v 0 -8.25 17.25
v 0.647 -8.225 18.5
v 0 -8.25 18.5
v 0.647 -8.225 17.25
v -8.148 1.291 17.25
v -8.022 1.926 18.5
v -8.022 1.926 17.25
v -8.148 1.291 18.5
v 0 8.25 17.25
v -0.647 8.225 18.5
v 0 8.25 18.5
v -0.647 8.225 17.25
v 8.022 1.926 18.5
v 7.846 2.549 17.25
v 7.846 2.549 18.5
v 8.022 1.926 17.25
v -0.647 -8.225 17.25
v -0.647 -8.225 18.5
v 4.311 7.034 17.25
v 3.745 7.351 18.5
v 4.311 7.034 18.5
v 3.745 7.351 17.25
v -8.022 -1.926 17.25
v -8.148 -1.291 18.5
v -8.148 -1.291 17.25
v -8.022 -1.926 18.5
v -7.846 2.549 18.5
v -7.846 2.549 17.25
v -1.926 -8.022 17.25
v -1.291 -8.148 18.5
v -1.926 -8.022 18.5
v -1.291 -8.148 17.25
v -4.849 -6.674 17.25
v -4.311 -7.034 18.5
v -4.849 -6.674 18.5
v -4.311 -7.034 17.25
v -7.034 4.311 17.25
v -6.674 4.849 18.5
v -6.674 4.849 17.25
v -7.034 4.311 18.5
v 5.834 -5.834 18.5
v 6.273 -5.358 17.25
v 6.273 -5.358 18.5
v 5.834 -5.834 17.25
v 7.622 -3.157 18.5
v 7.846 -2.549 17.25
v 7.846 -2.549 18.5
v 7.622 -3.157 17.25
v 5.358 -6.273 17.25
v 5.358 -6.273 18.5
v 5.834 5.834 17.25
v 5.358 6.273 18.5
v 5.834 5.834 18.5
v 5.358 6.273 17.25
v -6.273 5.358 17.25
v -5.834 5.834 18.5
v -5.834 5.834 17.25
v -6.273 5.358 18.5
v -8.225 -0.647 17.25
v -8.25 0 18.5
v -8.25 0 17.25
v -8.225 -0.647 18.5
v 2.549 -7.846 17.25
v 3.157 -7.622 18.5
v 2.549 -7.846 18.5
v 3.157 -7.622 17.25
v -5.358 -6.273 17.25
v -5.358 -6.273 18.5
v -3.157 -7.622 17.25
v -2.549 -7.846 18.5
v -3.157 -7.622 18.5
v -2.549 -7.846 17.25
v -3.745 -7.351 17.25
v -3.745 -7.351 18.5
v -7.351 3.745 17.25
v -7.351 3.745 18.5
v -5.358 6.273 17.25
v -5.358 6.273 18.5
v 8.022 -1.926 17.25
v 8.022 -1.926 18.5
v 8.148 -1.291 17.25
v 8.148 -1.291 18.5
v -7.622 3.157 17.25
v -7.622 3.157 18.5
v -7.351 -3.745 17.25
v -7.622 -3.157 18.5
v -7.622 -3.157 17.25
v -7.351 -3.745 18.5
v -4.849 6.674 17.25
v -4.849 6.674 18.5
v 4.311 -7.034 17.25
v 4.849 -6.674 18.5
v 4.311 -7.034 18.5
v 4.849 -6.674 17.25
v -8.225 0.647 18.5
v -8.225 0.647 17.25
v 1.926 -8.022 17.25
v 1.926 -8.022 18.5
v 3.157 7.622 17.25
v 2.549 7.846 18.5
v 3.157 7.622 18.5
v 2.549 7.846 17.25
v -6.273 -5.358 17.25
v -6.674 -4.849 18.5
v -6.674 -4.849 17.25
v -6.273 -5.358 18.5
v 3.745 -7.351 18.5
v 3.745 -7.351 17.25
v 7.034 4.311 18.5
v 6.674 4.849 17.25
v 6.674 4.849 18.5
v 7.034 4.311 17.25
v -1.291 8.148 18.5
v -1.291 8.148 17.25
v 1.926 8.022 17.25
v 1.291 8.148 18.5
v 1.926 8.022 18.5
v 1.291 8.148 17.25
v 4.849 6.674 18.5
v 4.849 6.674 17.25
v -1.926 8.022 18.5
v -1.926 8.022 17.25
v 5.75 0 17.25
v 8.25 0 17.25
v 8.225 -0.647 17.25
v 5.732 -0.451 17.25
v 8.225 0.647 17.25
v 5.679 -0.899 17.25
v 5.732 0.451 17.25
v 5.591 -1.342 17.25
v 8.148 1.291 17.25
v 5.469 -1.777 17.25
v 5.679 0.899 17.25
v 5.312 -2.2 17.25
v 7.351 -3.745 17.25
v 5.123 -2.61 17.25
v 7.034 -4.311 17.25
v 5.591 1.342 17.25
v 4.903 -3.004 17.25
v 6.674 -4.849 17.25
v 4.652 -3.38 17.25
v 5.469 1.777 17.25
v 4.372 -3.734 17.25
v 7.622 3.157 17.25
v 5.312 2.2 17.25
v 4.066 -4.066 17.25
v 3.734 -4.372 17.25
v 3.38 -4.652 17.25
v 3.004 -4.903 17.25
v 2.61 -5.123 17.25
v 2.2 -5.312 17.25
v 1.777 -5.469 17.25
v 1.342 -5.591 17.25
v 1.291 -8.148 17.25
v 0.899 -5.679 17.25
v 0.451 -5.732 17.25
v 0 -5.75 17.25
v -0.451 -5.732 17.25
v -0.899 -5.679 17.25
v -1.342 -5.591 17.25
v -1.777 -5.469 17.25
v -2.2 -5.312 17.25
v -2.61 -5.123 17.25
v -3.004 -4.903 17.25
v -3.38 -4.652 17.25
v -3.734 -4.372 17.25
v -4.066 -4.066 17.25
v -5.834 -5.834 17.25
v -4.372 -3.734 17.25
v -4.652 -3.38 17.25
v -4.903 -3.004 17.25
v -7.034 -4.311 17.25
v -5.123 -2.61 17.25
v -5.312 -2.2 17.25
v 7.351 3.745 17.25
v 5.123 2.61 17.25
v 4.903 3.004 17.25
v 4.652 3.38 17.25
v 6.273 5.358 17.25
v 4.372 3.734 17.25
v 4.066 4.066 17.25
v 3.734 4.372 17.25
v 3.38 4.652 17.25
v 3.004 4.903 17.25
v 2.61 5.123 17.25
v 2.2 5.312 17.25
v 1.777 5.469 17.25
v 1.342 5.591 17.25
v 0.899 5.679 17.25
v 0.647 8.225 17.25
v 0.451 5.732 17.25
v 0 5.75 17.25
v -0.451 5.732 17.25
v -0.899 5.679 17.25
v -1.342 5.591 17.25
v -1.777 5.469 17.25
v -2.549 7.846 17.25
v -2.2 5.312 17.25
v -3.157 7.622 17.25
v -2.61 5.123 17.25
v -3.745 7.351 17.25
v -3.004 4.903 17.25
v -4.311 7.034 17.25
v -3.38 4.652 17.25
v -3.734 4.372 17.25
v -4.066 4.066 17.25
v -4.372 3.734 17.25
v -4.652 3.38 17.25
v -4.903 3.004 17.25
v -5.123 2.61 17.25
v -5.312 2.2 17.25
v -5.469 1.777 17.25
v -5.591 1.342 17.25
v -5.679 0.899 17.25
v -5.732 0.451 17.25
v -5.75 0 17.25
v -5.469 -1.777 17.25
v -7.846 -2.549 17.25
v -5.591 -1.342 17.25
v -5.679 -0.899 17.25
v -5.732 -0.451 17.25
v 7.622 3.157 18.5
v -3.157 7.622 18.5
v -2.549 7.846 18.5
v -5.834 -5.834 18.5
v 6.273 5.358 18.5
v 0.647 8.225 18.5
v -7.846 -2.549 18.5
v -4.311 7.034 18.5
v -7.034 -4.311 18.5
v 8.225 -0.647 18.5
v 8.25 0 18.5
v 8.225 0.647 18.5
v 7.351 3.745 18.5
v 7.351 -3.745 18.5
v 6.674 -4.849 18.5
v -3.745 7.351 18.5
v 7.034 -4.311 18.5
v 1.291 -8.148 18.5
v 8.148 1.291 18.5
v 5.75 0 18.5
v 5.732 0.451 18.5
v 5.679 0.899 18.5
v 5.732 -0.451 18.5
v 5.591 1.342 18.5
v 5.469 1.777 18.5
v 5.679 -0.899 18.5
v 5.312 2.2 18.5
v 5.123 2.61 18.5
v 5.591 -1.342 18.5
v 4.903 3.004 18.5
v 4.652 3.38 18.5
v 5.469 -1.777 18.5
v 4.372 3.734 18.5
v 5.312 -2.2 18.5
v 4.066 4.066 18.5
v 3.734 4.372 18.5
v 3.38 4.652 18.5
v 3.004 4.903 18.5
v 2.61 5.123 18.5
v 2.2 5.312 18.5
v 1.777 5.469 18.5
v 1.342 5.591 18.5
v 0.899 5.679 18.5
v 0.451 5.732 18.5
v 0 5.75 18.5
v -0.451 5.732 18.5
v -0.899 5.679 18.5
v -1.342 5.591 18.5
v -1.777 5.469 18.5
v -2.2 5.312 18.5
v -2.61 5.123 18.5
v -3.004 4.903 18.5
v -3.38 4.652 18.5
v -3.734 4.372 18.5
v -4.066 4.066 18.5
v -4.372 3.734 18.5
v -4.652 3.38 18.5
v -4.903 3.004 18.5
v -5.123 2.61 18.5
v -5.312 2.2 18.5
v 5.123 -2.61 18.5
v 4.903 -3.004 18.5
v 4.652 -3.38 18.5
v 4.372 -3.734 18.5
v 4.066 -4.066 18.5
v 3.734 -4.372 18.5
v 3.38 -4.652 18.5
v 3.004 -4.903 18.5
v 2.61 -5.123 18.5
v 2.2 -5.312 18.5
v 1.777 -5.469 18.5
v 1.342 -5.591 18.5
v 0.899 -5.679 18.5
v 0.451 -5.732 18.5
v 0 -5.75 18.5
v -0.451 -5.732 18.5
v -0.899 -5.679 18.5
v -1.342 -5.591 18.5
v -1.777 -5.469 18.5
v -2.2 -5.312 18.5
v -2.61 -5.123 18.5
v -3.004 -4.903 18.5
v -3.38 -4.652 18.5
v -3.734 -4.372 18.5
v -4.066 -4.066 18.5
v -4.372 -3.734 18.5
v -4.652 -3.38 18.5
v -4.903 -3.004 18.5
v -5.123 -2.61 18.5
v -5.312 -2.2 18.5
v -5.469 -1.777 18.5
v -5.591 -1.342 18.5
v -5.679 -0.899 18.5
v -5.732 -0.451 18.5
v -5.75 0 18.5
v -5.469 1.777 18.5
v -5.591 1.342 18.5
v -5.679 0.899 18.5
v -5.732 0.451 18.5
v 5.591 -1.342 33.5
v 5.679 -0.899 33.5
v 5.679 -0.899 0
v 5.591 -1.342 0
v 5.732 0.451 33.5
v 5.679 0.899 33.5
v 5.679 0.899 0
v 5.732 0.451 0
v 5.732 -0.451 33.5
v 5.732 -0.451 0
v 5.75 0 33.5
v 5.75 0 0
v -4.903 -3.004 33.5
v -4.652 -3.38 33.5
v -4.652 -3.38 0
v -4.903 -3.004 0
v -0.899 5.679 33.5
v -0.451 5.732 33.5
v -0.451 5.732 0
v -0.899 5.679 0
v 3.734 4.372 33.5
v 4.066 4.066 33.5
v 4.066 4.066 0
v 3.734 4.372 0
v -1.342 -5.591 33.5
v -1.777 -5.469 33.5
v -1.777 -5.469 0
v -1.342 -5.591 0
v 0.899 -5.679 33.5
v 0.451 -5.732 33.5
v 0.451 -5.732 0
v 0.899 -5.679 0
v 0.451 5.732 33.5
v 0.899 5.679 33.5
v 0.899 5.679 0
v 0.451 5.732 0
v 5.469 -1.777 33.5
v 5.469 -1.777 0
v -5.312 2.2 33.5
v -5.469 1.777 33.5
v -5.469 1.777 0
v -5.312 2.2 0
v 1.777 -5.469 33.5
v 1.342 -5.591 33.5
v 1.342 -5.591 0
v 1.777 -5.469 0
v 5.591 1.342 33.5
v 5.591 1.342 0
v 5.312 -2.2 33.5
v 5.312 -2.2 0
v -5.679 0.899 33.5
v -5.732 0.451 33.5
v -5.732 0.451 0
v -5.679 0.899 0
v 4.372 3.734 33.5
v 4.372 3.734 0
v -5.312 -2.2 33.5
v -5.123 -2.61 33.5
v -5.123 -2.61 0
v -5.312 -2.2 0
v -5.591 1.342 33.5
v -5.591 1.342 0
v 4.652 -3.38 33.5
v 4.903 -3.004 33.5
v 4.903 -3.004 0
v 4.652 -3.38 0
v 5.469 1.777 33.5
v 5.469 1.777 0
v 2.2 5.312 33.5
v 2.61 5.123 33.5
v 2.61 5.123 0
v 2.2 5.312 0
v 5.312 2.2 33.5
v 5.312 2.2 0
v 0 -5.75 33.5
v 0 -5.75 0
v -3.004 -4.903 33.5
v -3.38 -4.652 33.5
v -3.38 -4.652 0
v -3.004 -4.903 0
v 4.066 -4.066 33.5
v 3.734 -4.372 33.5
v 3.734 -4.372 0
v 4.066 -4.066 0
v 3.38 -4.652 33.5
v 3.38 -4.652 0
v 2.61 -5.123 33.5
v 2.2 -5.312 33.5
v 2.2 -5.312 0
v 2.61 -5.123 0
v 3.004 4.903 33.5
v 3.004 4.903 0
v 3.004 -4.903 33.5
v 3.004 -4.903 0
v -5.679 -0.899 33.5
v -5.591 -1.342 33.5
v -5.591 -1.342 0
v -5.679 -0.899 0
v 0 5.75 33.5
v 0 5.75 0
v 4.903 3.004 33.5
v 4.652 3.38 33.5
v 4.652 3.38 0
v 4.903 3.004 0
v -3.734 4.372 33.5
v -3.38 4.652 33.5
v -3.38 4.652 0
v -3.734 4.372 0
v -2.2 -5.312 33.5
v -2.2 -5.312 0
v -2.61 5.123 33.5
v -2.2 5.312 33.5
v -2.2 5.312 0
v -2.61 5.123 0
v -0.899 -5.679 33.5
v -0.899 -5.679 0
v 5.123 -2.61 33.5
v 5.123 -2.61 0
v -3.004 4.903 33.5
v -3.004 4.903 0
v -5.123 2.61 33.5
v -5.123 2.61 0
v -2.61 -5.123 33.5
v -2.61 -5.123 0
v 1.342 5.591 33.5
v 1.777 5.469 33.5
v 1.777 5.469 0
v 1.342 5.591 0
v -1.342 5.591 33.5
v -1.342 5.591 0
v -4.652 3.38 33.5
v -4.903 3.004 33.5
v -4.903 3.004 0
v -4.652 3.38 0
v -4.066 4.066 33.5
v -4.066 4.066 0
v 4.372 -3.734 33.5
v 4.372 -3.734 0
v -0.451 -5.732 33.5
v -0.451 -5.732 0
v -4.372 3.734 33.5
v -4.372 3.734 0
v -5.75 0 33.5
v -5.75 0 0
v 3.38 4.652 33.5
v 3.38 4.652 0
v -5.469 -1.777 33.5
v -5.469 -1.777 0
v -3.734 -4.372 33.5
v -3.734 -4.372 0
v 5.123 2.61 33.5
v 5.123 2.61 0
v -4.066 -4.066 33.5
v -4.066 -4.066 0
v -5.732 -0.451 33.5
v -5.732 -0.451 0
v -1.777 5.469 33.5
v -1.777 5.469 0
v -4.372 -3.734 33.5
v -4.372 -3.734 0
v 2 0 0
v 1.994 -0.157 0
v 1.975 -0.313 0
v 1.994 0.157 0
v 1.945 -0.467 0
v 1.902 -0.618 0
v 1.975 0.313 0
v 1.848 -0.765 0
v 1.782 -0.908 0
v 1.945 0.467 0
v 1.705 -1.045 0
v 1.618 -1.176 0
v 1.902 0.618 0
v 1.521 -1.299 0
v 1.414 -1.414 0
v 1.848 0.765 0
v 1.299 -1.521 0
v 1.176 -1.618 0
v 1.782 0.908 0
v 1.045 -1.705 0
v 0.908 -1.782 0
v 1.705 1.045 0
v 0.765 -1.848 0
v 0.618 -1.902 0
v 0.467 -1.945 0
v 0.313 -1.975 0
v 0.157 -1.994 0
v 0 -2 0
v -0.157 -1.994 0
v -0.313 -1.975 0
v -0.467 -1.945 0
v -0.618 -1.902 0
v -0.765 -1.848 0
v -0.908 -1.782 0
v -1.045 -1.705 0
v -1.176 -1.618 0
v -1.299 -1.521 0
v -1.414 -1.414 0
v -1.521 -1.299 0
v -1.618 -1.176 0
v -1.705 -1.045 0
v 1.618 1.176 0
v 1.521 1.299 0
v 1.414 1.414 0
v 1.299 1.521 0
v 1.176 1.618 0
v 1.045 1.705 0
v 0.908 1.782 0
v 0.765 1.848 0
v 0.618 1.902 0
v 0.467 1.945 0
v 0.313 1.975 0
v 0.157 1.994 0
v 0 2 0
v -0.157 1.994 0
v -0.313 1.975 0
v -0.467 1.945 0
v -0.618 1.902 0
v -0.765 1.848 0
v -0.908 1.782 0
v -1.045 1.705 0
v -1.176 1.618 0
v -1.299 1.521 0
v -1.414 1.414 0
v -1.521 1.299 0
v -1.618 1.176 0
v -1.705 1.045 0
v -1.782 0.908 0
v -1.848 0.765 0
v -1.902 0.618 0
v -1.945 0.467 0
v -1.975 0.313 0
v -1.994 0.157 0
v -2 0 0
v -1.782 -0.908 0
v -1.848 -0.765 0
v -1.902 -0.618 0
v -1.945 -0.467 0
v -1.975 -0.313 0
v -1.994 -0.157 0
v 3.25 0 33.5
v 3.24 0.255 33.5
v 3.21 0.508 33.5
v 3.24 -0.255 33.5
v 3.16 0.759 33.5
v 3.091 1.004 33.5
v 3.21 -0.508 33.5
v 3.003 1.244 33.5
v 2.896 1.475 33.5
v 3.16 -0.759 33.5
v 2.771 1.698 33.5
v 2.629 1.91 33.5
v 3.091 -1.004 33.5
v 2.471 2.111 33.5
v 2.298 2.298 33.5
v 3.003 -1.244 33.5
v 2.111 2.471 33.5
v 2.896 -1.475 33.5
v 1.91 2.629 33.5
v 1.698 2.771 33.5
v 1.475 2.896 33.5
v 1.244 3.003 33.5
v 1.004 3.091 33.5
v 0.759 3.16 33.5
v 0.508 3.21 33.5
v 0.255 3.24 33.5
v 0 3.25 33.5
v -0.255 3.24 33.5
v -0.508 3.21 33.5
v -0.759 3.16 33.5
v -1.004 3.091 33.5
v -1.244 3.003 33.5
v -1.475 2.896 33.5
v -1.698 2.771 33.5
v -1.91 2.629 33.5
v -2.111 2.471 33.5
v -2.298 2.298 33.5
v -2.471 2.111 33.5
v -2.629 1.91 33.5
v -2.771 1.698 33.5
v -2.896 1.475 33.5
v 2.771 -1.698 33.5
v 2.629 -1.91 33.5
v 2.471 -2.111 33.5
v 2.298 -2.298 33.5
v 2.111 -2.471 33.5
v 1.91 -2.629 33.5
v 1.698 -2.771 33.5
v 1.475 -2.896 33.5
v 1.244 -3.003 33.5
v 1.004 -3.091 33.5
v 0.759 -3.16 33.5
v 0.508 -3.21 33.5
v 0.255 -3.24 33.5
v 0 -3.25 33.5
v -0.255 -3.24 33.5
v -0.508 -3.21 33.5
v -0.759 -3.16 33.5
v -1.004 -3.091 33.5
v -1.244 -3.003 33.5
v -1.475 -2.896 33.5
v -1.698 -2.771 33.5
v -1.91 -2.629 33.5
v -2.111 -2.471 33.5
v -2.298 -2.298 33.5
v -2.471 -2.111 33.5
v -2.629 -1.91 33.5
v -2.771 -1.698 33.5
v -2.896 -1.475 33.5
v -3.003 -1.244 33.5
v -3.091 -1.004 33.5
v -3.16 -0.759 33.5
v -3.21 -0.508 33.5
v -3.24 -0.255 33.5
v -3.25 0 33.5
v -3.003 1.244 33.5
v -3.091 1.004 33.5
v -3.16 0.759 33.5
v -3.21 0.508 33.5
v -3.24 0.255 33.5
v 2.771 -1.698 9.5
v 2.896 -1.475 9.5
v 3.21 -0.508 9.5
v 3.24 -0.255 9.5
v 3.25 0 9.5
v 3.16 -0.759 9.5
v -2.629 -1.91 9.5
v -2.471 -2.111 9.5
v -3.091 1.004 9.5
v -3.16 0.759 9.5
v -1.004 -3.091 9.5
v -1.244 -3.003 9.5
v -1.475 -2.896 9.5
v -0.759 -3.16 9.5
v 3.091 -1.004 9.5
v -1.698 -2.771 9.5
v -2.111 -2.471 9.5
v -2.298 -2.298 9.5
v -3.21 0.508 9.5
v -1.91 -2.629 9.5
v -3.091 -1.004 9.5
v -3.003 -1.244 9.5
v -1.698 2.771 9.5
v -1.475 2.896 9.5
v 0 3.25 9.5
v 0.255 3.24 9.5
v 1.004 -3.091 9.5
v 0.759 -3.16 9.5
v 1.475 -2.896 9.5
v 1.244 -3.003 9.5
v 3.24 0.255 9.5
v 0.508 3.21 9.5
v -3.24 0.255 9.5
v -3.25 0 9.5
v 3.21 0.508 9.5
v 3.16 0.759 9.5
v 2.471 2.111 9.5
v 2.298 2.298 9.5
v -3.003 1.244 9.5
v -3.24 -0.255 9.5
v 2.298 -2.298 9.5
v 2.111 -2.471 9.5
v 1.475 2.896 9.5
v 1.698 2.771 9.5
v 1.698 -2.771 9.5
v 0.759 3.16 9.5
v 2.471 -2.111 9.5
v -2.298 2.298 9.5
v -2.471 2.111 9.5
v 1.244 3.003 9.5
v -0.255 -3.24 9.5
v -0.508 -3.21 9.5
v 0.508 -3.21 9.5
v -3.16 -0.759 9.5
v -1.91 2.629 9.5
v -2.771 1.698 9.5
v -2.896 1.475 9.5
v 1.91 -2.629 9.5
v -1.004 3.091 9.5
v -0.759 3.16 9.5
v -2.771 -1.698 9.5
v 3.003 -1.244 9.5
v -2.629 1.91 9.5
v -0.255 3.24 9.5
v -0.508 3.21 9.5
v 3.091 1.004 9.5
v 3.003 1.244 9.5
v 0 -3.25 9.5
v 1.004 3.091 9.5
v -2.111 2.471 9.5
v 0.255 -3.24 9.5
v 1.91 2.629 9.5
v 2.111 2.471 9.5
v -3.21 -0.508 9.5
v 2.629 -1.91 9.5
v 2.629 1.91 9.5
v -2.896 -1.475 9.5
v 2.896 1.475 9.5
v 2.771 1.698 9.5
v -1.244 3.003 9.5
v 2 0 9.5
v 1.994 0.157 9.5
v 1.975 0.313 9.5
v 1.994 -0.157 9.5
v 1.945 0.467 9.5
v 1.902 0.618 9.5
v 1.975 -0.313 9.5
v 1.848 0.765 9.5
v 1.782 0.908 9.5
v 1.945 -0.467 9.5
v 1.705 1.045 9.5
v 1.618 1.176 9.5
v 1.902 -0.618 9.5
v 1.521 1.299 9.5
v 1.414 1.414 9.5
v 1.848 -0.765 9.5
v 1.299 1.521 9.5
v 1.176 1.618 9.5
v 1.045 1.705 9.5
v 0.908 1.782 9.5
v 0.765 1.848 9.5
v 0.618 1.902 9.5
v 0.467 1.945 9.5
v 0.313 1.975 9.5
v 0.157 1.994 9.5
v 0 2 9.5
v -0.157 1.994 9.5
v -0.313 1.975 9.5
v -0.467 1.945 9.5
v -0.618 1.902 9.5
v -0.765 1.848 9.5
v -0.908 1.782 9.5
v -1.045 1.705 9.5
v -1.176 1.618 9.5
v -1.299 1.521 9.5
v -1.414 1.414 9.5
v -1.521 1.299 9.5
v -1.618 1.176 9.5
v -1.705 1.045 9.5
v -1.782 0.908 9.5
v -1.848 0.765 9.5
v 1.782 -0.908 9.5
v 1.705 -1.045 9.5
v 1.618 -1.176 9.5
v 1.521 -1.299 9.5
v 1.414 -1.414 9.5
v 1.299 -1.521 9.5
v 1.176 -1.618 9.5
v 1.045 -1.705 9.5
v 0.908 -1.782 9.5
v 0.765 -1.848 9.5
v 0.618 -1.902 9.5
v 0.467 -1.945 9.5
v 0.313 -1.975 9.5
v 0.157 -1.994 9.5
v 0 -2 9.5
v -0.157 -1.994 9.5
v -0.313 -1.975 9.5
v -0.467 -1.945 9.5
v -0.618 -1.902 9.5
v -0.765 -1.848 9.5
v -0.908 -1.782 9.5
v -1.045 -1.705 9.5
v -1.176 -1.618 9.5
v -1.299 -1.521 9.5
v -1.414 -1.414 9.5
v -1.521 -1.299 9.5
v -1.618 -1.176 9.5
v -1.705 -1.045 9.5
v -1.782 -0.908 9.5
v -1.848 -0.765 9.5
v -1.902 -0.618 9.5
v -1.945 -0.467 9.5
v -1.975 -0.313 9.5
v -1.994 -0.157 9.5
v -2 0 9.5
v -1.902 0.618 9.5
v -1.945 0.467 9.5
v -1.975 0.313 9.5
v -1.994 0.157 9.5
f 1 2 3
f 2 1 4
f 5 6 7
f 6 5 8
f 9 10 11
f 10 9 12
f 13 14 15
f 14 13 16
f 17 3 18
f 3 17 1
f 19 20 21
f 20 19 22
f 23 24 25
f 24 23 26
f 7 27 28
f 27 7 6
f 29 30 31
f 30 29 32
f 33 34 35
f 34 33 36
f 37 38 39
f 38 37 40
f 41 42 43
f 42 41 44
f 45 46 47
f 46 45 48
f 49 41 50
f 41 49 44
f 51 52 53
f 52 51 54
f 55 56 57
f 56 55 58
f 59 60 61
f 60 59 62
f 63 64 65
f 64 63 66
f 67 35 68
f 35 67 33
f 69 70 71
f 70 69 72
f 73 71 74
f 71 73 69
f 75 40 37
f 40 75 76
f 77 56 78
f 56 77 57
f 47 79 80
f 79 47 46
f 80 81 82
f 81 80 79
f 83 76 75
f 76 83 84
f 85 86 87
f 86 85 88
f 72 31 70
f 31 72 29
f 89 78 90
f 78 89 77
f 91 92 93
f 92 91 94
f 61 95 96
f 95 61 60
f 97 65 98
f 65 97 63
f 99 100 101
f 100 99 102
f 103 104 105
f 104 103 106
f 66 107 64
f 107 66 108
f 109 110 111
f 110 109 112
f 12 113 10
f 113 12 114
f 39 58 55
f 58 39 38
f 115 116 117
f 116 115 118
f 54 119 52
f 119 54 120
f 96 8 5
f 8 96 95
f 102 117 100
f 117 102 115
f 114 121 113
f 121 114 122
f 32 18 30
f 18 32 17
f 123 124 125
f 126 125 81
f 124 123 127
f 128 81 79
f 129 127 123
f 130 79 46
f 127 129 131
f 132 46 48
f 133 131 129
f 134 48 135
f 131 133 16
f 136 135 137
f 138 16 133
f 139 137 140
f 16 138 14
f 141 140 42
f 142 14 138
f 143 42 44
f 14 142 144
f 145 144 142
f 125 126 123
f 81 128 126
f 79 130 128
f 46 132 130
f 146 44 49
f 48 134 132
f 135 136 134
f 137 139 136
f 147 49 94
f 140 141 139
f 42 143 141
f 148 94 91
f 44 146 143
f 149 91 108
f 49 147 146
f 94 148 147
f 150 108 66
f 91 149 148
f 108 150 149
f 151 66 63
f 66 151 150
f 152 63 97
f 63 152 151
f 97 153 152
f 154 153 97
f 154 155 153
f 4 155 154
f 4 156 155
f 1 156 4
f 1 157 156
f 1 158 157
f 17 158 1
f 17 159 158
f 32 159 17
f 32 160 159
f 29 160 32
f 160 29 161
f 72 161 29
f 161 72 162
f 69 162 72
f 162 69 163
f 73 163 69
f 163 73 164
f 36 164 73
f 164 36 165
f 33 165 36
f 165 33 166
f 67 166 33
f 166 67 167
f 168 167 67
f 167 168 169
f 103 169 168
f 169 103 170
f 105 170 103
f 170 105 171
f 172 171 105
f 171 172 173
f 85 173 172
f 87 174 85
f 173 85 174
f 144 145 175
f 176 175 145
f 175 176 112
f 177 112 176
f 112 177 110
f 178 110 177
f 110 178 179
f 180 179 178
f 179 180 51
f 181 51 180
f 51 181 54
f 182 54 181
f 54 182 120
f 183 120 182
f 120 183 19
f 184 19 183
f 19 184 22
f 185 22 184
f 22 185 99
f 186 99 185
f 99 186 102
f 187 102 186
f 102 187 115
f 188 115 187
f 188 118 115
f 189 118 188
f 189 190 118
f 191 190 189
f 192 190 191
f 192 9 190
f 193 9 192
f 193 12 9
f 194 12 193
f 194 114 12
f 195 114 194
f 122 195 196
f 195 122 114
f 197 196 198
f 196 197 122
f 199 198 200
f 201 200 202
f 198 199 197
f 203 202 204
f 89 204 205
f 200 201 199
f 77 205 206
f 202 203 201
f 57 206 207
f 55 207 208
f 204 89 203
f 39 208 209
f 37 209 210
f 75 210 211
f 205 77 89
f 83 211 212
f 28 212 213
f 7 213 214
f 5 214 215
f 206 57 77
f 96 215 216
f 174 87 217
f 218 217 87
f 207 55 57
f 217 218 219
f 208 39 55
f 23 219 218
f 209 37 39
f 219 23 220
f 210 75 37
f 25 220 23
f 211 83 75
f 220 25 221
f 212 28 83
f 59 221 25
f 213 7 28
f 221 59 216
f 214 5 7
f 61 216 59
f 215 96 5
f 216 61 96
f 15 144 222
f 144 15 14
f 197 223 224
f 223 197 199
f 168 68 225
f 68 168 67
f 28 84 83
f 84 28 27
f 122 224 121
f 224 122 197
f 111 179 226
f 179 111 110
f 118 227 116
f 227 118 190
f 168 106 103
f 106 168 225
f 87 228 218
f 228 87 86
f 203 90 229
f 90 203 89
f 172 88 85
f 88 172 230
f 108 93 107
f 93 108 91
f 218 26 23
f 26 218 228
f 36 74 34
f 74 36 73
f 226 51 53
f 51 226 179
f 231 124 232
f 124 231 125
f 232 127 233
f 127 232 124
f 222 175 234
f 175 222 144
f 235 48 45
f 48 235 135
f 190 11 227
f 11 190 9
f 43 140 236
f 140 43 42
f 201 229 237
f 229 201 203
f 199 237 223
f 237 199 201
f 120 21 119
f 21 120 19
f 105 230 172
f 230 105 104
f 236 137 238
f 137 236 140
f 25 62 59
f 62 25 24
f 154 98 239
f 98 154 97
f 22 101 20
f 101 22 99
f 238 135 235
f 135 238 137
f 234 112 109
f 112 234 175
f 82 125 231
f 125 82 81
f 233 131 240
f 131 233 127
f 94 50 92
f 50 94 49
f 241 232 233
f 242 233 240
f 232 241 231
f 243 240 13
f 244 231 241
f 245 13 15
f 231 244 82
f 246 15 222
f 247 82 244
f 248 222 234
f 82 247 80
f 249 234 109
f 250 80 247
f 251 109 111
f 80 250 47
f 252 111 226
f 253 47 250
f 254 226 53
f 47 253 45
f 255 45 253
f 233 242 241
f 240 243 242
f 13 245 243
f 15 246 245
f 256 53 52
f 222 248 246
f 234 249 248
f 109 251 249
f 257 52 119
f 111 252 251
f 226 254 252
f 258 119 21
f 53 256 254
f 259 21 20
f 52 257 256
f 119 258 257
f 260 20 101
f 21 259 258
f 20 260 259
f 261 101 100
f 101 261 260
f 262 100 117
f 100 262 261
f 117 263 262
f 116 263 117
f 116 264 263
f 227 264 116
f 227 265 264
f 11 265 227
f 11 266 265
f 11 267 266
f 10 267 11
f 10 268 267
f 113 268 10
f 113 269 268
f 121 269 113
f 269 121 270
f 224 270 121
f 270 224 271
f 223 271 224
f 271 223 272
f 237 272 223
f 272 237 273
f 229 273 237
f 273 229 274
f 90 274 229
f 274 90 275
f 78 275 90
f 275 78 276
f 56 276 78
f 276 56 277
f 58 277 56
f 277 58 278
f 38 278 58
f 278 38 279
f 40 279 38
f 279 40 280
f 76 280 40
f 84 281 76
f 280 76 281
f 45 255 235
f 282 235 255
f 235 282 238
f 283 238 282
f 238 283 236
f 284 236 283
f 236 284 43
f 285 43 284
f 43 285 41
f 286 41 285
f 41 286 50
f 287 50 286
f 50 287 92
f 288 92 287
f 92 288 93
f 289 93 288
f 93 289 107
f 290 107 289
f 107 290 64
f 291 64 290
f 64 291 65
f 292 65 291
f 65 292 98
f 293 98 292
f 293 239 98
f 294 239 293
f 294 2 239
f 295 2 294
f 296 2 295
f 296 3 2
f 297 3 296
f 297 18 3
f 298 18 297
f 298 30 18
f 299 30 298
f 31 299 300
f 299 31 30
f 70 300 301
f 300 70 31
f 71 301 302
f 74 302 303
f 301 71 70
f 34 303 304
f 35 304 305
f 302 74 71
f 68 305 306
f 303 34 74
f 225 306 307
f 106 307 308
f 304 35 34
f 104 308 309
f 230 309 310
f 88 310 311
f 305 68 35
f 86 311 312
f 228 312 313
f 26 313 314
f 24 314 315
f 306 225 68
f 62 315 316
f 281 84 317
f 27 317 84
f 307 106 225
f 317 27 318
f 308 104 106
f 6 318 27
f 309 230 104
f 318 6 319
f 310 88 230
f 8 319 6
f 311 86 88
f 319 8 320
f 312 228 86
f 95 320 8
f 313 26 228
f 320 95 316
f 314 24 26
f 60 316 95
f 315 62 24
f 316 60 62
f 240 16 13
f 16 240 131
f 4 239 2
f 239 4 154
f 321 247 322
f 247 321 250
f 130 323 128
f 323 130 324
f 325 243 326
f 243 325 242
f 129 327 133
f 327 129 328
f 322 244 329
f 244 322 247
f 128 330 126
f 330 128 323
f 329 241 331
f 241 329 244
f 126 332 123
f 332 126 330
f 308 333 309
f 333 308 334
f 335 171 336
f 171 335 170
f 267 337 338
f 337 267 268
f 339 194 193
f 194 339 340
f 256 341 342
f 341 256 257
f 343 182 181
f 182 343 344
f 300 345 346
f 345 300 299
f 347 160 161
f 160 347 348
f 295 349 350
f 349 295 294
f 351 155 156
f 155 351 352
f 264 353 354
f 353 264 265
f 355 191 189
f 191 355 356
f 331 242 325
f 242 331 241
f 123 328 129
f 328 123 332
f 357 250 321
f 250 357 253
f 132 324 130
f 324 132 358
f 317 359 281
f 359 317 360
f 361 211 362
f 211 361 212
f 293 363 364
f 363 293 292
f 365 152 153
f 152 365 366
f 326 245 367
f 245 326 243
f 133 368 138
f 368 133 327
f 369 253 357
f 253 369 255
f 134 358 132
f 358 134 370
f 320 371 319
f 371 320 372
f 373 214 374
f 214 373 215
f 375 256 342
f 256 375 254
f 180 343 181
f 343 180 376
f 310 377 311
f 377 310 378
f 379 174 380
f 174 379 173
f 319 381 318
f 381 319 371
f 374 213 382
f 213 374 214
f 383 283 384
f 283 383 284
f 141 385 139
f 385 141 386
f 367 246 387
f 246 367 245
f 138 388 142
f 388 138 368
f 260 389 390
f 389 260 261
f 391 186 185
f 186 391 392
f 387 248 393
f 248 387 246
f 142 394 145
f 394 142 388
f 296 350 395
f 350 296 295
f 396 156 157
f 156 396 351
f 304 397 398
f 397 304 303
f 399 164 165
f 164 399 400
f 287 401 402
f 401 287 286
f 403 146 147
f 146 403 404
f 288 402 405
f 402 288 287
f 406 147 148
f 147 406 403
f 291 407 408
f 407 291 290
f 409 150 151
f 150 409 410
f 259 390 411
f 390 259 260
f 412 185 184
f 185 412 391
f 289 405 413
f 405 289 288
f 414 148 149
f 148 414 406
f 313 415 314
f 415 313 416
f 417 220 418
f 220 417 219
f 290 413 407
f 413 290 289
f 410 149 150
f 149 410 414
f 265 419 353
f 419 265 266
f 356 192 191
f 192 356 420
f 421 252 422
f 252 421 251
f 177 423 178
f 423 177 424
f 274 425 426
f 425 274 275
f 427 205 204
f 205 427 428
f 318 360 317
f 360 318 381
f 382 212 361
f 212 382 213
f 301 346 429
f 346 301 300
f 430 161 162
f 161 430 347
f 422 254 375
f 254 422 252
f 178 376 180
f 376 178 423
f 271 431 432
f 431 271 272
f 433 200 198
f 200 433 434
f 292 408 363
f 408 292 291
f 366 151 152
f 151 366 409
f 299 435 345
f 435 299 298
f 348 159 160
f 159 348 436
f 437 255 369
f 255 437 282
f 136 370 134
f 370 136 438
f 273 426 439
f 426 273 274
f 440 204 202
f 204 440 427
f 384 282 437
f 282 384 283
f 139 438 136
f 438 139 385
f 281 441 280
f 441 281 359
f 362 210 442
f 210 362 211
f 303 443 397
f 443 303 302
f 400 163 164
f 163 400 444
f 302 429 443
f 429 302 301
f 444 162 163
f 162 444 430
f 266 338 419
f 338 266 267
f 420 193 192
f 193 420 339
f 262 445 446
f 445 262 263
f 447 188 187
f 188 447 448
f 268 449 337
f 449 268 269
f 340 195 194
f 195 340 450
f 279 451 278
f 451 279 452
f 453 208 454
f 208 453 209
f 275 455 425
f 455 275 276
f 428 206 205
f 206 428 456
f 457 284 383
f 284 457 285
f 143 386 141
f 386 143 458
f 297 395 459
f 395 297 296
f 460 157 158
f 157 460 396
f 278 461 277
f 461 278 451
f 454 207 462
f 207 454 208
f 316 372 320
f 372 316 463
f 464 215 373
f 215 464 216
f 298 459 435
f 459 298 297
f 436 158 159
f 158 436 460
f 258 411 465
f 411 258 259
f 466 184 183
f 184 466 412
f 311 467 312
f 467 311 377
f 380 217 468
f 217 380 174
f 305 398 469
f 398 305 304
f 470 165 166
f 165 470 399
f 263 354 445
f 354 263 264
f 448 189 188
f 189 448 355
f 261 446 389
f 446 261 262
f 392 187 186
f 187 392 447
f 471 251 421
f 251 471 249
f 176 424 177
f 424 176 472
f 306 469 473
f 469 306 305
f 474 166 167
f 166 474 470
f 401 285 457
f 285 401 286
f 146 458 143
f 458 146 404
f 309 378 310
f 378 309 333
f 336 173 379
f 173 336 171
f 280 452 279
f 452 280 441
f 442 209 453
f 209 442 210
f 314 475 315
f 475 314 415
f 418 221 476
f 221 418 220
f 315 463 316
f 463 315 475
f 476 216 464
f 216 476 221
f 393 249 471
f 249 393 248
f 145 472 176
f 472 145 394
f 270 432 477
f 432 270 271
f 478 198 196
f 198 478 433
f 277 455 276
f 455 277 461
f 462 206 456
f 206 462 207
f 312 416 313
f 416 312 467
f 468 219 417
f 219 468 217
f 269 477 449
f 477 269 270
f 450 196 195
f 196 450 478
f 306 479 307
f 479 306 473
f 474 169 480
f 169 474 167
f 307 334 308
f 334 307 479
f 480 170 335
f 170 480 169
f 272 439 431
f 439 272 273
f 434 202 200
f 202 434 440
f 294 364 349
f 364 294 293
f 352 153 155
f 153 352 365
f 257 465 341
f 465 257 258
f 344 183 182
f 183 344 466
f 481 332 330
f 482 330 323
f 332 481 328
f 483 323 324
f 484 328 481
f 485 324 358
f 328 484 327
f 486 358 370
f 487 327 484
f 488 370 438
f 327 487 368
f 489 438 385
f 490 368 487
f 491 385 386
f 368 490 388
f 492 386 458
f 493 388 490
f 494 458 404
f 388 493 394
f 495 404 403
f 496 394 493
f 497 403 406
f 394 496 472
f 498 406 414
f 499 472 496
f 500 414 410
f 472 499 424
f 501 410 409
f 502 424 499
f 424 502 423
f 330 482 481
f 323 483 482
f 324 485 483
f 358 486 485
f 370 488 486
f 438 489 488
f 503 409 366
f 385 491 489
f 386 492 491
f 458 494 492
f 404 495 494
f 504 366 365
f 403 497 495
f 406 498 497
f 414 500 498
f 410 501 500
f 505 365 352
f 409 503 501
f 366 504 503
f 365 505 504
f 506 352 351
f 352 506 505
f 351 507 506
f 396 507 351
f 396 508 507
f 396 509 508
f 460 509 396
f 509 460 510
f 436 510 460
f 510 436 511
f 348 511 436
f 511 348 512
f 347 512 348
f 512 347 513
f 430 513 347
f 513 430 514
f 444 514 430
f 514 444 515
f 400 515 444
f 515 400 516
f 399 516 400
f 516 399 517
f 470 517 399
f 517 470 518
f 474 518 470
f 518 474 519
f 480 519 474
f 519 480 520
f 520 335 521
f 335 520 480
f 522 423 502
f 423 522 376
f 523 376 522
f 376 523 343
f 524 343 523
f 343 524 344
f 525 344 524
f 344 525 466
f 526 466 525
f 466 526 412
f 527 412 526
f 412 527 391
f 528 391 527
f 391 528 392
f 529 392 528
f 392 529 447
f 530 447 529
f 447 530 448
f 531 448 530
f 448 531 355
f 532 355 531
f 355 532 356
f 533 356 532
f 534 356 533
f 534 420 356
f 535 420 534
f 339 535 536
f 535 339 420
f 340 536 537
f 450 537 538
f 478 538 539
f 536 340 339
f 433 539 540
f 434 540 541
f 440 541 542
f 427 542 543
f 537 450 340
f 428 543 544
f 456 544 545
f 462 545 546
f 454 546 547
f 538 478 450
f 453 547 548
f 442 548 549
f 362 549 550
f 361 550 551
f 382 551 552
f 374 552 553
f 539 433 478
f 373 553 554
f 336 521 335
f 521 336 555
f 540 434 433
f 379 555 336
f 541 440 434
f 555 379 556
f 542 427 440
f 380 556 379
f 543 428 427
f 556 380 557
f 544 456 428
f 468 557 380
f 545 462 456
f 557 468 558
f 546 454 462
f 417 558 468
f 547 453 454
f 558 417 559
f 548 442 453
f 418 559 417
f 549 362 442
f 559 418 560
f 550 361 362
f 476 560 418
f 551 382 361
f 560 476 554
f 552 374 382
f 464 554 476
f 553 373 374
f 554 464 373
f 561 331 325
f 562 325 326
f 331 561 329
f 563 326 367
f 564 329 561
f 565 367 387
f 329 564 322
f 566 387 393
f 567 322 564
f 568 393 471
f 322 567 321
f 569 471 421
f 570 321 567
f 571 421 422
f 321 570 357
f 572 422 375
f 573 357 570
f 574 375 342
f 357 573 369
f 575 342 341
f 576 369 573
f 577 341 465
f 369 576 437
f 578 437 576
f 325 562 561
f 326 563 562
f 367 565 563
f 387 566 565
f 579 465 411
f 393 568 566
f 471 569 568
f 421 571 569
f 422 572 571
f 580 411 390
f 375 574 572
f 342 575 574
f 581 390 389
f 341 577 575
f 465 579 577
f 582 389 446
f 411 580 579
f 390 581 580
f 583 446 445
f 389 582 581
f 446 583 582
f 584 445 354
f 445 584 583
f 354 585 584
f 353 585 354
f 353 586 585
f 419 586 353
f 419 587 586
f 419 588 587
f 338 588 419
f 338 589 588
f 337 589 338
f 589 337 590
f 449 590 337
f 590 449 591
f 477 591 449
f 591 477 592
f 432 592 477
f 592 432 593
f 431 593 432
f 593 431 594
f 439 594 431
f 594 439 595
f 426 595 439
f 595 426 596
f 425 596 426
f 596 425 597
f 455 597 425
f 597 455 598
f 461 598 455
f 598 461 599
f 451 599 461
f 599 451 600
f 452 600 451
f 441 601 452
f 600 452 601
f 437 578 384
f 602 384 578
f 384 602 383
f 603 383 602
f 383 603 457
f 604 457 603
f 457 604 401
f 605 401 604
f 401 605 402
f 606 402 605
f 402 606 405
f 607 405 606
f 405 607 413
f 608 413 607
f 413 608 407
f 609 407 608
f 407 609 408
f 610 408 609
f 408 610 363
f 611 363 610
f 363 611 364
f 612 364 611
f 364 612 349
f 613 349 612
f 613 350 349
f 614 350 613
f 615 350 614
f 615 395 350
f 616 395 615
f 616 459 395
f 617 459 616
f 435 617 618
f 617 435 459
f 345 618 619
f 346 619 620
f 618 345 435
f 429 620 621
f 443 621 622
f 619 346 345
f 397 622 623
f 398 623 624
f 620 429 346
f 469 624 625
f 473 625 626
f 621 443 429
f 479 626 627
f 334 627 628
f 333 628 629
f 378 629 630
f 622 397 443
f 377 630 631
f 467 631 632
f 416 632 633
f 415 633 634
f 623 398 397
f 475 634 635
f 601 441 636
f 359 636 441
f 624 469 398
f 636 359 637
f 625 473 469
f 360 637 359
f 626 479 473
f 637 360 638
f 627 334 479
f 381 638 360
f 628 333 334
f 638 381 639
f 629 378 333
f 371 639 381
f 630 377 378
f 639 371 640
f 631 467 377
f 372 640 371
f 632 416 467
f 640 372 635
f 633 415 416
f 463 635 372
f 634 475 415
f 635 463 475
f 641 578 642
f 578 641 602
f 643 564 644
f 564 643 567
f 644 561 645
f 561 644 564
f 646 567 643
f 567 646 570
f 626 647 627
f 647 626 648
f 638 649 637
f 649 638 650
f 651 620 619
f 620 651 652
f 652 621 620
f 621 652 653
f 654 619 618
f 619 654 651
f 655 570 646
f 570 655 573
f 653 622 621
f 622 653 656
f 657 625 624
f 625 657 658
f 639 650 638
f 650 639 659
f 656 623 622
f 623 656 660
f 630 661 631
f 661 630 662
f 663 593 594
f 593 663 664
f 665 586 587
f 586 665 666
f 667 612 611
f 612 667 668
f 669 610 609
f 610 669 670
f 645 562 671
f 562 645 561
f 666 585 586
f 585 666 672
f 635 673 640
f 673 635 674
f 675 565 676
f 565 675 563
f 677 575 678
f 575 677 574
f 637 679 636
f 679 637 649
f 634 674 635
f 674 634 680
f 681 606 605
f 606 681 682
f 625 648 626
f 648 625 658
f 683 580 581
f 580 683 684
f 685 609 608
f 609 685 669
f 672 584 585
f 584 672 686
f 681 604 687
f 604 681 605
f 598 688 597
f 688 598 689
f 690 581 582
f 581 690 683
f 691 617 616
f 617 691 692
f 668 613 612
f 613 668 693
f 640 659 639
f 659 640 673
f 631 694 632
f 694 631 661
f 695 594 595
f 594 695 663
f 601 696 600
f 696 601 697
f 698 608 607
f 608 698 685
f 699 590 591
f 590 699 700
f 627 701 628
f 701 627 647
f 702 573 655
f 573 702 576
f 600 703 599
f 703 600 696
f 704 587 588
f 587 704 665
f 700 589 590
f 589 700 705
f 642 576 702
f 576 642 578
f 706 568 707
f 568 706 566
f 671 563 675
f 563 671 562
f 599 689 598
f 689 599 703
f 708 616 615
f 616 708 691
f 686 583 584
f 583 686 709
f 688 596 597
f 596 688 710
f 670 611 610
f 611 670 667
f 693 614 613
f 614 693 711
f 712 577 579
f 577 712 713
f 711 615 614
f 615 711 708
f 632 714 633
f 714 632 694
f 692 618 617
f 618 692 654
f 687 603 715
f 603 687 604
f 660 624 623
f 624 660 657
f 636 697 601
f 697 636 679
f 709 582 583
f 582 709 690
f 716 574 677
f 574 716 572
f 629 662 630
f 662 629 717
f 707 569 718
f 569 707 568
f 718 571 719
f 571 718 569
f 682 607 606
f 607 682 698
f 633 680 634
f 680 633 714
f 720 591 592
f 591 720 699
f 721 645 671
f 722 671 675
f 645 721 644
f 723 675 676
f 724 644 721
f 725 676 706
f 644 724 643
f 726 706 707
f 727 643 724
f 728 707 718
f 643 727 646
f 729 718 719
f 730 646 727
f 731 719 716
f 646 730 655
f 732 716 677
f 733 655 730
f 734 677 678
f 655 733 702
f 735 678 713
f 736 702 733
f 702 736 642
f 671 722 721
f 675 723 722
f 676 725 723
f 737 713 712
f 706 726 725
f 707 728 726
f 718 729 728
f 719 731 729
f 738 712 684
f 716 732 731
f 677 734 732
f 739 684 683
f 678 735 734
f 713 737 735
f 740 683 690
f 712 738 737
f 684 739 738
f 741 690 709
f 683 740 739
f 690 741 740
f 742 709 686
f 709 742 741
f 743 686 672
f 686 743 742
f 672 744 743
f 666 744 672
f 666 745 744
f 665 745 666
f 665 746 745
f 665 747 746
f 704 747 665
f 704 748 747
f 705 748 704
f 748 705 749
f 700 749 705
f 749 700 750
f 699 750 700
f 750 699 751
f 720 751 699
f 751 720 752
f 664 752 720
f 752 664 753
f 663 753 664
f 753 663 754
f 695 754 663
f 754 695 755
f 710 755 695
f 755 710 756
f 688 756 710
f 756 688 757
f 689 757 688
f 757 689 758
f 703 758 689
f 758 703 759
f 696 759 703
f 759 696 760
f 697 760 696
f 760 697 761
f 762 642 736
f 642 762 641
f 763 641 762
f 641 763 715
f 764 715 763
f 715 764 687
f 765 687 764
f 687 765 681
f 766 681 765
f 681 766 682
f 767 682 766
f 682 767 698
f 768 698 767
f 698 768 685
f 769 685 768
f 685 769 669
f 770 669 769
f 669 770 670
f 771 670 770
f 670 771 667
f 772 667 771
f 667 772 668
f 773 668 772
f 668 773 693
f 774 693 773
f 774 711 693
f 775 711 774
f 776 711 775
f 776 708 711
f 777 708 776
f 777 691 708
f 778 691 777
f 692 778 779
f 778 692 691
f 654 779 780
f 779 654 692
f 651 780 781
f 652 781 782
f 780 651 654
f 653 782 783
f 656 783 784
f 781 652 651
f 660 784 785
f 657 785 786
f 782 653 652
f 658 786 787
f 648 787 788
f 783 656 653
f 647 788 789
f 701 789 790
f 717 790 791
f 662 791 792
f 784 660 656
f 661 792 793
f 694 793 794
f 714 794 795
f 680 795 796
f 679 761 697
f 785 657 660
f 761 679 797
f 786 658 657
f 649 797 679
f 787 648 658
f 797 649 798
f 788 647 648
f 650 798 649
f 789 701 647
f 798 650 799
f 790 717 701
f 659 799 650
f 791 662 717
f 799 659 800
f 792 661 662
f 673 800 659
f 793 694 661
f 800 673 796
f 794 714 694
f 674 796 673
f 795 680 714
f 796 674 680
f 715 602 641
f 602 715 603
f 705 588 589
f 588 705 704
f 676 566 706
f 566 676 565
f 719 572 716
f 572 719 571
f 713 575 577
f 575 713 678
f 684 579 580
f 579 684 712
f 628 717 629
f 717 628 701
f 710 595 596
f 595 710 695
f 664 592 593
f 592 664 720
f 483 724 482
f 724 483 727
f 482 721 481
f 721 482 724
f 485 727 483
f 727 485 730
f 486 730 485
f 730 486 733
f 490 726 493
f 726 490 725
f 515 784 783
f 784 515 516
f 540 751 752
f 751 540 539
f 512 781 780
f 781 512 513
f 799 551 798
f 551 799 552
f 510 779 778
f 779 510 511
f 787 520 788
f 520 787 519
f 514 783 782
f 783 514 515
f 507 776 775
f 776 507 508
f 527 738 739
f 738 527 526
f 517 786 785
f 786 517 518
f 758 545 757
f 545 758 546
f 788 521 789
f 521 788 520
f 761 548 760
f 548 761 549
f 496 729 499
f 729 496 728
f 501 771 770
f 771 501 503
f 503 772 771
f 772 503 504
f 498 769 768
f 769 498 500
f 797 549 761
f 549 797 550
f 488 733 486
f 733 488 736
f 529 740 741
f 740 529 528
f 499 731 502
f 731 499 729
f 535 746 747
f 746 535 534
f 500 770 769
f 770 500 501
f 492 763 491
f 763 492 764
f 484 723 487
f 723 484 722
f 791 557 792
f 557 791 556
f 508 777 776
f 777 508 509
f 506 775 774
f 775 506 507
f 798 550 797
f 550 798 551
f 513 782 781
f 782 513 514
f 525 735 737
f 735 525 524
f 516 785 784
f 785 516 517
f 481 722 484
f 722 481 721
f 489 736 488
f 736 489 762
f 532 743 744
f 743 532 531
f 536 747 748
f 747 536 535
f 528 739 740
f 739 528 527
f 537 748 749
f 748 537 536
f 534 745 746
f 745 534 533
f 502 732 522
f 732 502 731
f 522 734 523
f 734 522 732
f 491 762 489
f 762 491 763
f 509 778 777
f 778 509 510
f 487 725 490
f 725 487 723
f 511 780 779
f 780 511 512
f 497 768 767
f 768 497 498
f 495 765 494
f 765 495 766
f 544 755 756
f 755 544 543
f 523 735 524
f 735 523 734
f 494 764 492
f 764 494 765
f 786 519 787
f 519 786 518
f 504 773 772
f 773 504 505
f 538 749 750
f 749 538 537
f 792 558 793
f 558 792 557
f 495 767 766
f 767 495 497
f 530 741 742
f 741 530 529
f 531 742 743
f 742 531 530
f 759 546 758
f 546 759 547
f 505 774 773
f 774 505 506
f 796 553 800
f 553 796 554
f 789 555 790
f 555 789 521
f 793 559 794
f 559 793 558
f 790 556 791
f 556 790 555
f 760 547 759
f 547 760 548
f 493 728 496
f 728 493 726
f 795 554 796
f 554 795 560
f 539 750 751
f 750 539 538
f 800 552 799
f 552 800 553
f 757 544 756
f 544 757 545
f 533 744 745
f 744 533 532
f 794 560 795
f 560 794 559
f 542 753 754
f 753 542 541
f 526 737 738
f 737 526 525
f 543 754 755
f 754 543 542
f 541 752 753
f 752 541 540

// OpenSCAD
// file: common.scad
// Measurements and routines common across adapters.

band_full_thickness = 1.25;    // thickest point of the band
band_full_diameter = 16.5;  // diameter at widest point of band

// profile = [
//     [0,0],
//     [band_edge_diameter / 2, 0],
//     [band_full_diameter / 2, (band_full_thickness - band_edge_thickness) / 2],
//     [band_full_diameter / 2, band_full_thickness - ((band_full_thickness - band_edge_thickness) / 2)],
//     [band_edge_diameter / 2, band_full_thickness],
//     [0,band_full_thickness],
// ];

profile = [
    [0,0],
    [band_full_diameter / 2, 0],
    [band_full_diameter / 2, band_full_thickness],
    [0,band_full_thickness],
];

module band() {
    rotate_extrude($fn=80) polygon(points=profile);
}
// main file
// Plotter pen adapter for uni-ball 207 Signo
//
// Modified by Sasha Kovar <sasha-thing@arcocene.org>
// from a design by Brian Boucheron <brian@boucheron.org>

include <common.scad>;

body_outer_diameter = 11.5; // outer diameter of the main body
body_inner_diameter = 6.5; // inner diameter of the main body
body_height = 13.5;

translate([0,0,33.5]) 
rotate([180,0,0])
translate([0,0,15]) 
difference() {
    union() {
        band();
        cylinder(r=body_outer_diameter/2, h=body_height + 5, $fn=80);
        translate([0,0,-15]) cylinder(r=body_outer_diameter/2, h=body_height + 5, $fn=80);
    }

    translate([0,0,-15]) cylinder(r=body_inner_diameter/2, h=24, $fn=80);
    translate([0,0,0]) cylinder(r=4/2, h=25, $fn=80);
}
